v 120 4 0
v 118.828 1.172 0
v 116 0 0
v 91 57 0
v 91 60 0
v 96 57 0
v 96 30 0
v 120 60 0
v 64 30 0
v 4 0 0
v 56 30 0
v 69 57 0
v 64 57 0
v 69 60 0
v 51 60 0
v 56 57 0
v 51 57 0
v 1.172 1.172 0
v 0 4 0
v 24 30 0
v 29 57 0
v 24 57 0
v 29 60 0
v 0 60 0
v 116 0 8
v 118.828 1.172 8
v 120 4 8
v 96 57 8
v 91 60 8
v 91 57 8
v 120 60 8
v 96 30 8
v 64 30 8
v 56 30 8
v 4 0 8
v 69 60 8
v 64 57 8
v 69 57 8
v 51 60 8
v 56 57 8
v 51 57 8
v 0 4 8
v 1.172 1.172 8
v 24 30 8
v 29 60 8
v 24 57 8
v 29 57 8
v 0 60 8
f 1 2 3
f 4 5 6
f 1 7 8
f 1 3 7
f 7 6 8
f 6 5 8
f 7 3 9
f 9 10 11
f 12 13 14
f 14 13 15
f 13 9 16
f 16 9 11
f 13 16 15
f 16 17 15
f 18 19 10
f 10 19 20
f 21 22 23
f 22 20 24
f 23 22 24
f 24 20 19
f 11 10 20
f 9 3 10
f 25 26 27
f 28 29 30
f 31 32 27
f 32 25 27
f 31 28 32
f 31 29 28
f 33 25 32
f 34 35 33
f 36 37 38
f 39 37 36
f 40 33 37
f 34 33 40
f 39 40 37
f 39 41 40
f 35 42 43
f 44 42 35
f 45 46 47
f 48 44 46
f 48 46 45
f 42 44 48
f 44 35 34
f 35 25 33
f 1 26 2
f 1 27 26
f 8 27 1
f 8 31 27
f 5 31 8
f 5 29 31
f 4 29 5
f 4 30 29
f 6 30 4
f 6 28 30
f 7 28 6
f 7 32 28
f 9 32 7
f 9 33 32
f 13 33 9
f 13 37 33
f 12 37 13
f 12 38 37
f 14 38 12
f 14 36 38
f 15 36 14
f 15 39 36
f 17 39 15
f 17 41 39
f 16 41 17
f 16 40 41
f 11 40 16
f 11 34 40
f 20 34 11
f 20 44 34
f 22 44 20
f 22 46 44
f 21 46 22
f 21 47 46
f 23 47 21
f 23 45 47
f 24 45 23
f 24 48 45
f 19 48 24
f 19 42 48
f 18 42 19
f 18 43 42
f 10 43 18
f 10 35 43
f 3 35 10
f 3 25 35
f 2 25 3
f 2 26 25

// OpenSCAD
$fn = 32;

// ----------------------------------------------------------------------
// Oversize slot bar: 120 mm bar with 2 oversize windows
// ----------------------------------------------------------------------

// --- parameters (mm) ---
profile_height = 8;       // extrusion height
profile_points = 24;      // points of the closed outline

profile = [[0, 4], [1.172, 1.172], [4, 0], [116, 0], [118.828, 1.172], [120, 4], [120, 60], [91, 60], [91, 57], [96, 57], [96, 30], [64, 30], [64, 57], [69, 57], [69, 60], [51, 60], [51, 57], [56, 57], [56, 30], [24, 30], [24, 57], [29, 57], [29, 60], [0, 60]];  // single closed polygon, 24 points, counter clockwise

// --- the one profile operation ---
linear_extrude(height = profile_height) polygon(points = profile);
